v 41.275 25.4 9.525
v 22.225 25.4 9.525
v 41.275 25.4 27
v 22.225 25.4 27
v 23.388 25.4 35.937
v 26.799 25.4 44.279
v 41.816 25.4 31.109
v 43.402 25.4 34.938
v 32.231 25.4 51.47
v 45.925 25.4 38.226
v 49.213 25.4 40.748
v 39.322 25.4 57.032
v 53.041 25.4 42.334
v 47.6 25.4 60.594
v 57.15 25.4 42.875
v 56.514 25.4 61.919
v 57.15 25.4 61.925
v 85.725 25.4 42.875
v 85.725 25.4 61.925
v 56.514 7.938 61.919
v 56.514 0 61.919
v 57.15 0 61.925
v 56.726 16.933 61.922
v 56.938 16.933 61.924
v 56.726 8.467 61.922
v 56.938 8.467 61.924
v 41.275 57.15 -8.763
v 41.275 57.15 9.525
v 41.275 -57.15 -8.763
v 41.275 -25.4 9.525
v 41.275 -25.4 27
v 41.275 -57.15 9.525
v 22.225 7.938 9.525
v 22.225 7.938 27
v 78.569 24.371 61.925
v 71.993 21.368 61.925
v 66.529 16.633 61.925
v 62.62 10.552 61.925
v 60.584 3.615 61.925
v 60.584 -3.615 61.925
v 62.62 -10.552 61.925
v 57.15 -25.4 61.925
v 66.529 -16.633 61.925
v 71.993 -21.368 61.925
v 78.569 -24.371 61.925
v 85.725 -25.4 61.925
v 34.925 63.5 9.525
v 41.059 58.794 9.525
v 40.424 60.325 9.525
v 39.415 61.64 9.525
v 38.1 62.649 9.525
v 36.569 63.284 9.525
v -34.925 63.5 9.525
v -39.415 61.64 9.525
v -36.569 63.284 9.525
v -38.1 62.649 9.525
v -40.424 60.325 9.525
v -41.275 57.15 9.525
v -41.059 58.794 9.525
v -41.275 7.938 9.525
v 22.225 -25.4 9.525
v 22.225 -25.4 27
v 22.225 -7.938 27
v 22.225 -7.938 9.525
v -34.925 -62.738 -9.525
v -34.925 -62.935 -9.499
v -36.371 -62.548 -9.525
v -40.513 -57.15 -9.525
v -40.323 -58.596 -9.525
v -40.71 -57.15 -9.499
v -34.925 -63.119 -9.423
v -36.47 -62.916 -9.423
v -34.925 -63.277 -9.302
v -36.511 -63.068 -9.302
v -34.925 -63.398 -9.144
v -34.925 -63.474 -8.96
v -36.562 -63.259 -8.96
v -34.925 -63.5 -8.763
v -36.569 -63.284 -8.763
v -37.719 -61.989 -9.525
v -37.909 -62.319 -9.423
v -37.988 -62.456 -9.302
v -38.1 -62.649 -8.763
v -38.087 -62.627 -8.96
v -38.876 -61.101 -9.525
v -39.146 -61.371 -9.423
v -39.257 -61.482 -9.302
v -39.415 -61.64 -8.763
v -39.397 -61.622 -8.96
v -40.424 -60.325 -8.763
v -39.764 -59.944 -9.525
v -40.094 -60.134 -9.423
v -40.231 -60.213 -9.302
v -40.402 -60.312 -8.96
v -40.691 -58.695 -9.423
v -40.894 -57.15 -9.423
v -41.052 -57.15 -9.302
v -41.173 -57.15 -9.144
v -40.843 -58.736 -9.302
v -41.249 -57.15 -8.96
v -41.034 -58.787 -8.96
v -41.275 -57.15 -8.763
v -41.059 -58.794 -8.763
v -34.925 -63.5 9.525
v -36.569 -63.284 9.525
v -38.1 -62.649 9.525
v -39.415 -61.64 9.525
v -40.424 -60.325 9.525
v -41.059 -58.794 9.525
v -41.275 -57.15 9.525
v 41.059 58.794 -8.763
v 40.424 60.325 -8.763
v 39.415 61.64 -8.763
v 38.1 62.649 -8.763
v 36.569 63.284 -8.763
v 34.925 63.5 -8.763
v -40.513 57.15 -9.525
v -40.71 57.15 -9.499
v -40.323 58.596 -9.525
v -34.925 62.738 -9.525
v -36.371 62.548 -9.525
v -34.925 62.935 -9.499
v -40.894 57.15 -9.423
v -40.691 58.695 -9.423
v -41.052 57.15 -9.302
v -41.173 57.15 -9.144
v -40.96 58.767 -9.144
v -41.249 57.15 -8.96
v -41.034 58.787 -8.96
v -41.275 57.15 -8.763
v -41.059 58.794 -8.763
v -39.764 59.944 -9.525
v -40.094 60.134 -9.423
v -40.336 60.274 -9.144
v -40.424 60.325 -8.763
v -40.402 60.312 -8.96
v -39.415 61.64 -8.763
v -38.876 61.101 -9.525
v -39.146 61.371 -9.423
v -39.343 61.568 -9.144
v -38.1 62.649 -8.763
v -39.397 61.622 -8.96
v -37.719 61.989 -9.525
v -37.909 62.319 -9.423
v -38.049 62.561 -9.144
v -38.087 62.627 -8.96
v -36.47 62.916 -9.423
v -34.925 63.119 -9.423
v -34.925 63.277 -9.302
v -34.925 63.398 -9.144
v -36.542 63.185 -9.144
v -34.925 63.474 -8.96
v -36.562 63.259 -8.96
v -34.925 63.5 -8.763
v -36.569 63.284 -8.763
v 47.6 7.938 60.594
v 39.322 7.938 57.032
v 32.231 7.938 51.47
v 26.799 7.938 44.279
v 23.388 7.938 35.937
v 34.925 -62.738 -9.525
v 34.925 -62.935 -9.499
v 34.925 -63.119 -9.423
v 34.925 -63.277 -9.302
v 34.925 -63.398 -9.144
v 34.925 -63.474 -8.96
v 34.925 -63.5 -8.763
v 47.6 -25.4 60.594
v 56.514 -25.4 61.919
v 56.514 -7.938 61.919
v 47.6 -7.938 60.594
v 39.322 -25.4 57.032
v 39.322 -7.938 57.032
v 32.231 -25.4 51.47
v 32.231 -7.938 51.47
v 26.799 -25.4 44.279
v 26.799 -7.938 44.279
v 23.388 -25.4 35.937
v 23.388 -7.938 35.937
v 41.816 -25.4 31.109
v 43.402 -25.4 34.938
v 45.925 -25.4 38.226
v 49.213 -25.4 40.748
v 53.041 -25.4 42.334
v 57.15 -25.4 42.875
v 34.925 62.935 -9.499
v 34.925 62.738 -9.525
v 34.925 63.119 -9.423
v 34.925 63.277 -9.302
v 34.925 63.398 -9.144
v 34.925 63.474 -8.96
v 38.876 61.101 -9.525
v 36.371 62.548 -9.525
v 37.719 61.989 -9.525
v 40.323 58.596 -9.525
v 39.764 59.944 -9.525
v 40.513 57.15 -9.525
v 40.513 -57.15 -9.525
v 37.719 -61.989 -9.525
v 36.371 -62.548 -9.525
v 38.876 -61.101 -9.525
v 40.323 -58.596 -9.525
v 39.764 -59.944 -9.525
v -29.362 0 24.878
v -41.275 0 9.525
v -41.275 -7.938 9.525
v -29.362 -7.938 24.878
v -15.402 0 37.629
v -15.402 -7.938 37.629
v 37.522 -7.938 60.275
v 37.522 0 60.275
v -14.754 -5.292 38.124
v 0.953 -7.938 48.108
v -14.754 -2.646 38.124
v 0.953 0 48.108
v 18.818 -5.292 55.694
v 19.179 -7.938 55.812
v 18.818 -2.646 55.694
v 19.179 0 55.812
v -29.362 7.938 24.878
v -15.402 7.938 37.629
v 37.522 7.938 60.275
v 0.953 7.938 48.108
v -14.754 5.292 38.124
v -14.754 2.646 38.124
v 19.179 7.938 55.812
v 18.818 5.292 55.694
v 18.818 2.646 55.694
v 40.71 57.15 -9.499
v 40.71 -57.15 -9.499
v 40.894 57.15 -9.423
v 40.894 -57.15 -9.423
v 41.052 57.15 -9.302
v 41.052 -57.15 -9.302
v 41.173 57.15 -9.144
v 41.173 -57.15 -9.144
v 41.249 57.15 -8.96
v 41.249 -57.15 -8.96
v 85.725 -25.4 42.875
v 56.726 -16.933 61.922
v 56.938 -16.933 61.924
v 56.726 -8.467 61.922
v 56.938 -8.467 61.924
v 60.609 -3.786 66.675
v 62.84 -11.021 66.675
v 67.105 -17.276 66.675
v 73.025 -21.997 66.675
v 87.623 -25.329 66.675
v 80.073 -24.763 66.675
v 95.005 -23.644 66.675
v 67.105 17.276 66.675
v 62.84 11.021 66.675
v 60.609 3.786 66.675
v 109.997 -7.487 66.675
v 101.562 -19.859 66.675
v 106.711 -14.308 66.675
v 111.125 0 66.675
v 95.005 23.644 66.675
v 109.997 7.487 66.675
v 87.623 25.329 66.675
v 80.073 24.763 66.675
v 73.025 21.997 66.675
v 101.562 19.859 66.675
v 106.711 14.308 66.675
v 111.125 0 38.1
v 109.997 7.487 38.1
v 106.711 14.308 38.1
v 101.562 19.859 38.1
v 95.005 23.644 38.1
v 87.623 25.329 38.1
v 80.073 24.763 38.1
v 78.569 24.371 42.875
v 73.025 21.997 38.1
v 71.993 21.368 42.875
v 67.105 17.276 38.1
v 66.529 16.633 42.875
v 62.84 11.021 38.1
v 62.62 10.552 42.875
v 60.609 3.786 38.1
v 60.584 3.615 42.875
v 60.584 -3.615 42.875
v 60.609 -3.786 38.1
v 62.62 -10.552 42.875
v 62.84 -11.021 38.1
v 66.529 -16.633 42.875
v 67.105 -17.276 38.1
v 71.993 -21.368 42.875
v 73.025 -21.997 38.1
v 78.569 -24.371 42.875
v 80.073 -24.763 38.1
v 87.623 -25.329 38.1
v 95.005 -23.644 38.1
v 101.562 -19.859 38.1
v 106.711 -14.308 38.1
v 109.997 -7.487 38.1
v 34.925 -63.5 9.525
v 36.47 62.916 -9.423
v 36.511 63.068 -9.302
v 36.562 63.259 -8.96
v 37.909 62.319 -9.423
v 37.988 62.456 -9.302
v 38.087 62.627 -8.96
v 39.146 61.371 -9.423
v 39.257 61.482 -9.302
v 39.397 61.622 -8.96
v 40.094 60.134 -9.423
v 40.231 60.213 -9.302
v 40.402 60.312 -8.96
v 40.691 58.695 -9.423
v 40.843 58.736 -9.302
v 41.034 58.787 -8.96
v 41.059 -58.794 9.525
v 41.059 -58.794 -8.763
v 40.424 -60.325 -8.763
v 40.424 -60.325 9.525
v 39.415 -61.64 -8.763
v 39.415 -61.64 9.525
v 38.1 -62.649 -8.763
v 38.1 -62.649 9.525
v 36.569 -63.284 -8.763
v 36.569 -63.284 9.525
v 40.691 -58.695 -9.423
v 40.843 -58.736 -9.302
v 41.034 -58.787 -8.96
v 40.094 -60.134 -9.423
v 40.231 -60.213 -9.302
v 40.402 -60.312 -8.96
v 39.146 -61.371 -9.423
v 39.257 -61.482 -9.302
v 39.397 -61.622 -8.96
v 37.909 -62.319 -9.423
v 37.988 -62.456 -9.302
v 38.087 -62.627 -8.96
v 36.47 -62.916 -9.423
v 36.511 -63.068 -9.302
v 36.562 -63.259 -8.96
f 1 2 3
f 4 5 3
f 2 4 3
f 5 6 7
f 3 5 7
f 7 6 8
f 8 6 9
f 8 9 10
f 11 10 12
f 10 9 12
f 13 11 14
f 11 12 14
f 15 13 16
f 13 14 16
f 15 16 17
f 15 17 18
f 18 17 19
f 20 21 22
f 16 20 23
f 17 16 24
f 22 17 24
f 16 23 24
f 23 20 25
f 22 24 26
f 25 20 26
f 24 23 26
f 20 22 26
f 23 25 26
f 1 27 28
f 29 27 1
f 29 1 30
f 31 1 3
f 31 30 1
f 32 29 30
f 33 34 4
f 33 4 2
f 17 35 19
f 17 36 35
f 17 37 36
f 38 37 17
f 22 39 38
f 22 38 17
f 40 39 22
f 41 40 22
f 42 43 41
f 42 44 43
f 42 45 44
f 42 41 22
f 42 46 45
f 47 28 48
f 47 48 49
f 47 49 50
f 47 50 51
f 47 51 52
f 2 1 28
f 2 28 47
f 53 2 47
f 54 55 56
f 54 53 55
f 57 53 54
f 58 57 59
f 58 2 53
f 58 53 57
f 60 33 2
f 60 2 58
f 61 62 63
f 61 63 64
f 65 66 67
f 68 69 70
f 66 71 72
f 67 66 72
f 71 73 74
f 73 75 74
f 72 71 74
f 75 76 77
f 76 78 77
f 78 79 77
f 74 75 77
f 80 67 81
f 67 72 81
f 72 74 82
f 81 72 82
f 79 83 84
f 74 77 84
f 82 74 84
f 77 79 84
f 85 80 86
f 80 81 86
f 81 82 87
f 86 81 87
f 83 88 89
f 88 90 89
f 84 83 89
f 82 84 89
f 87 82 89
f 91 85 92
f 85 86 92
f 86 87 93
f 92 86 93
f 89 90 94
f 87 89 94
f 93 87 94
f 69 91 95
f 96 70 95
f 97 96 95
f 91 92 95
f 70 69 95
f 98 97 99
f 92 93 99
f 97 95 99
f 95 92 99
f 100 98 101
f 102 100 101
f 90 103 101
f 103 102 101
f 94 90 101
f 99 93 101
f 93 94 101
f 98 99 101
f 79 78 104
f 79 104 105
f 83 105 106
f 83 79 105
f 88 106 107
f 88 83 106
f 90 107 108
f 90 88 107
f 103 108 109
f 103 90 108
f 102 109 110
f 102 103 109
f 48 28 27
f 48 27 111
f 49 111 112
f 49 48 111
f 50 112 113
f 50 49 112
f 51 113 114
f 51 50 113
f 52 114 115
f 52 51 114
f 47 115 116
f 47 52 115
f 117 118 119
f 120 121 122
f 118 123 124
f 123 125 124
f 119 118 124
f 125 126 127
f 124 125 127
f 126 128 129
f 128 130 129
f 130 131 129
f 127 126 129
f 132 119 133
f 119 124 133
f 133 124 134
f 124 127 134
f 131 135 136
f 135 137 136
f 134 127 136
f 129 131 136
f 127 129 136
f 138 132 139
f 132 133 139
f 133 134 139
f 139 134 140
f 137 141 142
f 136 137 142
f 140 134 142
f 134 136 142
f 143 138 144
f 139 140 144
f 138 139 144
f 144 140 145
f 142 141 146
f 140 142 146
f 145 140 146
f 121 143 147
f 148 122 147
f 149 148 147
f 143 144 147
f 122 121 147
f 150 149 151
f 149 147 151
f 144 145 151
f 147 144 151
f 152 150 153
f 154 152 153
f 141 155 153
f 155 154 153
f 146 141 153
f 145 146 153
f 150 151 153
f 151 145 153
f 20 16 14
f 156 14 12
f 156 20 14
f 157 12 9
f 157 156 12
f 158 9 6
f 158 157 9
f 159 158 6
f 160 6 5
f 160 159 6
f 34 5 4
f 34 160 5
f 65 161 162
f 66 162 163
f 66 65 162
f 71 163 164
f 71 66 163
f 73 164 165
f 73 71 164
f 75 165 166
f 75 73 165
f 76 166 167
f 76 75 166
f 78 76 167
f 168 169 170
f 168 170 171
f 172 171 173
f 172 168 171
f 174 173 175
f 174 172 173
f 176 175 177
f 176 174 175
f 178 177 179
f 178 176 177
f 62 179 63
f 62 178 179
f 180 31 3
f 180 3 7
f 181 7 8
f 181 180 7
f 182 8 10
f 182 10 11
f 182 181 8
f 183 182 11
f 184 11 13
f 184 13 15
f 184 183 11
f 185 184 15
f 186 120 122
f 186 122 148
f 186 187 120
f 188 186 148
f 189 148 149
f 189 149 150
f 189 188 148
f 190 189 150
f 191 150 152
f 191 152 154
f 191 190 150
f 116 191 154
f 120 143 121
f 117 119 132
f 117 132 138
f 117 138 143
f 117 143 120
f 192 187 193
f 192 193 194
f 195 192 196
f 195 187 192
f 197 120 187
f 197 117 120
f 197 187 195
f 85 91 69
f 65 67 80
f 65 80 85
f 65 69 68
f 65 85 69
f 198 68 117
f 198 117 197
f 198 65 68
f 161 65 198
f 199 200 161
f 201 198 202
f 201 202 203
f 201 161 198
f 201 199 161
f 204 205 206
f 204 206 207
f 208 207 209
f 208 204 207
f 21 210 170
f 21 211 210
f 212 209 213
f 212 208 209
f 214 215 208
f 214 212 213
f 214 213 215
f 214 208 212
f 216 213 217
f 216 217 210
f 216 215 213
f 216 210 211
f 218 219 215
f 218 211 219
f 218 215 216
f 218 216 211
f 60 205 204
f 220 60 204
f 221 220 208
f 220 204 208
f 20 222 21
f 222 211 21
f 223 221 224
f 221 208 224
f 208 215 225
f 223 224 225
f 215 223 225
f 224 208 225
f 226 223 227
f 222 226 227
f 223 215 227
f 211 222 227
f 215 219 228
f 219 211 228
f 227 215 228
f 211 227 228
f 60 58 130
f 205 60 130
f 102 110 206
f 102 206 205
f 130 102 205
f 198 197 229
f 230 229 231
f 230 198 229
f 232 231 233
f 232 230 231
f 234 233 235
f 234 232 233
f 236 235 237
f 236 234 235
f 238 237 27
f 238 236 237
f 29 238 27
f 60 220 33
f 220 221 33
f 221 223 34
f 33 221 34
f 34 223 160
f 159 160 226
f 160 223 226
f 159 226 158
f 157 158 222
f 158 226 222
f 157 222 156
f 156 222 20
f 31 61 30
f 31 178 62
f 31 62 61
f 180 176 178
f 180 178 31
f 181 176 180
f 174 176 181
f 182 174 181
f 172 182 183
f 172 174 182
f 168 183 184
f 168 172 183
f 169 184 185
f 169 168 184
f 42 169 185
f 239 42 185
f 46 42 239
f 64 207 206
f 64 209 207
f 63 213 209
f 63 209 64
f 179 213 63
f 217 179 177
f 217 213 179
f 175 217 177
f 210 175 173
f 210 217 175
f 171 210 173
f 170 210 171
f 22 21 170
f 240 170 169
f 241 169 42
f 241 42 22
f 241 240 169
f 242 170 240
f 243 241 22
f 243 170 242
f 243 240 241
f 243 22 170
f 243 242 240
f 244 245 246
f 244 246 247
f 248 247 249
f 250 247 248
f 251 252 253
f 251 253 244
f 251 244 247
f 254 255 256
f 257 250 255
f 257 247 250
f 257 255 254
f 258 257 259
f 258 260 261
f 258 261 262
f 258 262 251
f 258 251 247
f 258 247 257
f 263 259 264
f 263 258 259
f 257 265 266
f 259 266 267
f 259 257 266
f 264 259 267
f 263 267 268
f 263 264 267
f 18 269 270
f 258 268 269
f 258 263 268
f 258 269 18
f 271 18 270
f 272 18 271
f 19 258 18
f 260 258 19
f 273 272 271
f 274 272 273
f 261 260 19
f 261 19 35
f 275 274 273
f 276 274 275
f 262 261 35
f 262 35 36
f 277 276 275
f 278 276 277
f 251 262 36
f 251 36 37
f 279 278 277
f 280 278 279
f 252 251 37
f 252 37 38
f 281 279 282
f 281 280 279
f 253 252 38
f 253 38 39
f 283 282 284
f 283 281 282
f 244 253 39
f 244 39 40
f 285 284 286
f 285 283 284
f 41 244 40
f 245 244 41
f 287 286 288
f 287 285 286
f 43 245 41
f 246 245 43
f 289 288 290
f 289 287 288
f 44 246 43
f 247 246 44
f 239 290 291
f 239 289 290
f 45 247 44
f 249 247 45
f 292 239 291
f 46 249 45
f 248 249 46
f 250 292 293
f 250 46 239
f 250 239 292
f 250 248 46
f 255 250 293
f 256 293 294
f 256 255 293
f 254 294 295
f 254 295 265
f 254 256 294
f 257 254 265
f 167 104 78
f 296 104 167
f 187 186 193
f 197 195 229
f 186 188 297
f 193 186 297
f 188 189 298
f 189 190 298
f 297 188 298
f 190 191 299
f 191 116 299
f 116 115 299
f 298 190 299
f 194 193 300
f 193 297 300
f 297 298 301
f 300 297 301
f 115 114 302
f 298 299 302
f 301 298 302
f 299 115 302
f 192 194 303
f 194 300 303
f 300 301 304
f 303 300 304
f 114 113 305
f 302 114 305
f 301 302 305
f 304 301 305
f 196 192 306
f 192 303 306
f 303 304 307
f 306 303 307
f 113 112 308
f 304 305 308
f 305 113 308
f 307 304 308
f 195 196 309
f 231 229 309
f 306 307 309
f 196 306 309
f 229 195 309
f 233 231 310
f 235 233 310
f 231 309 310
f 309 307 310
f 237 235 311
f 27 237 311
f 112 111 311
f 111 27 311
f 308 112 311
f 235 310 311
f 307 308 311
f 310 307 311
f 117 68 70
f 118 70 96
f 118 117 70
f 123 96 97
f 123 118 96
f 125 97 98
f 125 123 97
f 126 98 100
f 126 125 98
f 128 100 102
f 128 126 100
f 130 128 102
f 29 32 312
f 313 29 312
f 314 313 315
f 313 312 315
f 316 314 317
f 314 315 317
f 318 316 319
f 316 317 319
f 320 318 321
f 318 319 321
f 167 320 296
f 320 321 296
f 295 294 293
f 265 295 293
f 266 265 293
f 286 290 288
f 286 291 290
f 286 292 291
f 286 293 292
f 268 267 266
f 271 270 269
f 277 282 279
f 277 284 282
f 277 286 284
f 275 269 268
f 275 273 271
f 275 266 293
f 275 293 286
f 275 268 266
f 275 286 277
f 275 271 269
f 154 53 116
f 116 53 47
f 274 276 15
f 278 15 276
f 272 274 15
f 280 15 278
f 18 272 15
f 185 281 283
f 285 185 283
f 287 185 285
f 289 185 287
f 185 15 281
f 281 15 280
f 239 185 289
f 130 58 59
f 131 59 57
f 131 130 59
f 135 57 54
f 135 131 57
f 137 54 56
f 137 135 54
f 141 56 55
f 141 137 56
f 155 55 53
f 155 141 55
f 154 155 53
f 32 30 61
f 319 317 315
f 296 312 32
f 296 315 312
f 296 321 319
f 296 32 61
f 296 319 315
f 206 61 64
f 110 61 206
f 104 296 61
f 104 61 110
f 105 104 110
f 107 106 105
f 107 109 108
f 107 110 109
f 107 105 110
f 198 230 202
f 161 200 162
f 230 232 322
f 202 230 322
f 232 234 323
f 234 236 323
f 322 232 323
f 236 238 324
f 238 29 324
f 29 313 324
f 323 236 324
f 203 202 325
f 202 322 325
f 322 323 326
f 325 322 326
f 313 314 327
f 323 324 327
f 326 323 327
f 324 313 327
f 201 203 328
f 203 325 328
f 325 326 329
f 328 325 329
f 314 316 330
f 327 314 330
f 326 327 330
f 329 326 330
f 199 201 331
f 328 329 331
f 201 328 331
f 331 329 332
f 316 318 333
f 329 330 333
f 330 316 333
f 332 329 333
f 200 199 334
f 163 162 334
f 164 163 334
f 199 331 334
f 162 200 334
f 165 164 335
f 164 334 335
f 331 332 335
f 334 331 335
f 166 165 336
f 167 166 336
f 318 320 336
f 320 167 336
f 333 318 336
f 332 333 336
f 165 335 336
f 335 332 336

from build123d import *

# Parameters (mm, degrees)
F1_DEPTH = 63.5
F0_W     = 25.4
F0_H     = 19.05
F2_DEPTH = 25.4
F3_DEPTH = 7.9375
F5_R     = 6.35
F6_R     = 0.762


with BuildPart() as f1:
    # F0 (on Front) → F1 (new body, symmetric)
    with BuildSketch(Plane.XZ):
        Polygon((41.275, -9.525), (41.275, 9.525), (22.225, 9.525), (-41.275, 9.525), (-41.275, -9.525), align=None)
    extrude(amount=F1_DEPTH, both=True)

    # F0 (on Front) → F2 (join, symmetric)
    with BuildSketch(Plane.XZ):
        with BuildLine():
            Line((22.225, 9.525), (41.275, 9.525))
            Line((41.275, 9.525), (41.275, 27.0002))
            ThreePointArc((41.275, 27.0002), (45.9246798487, 38.2255201513), (57.15, 42.8752))
            Line((57.15, 42.8752), (60.325, 42.8752))
            Line((60.325, 42.8752), (60.325, 61.9252))
            Line((60.325, 61.9252), (57.15, 61.9252))
            add(Edge.make_bspline(
                [(56.5144411646, 61.9194166288), (56.7262412244, 61.9218660962), (56.9380948845, 61.9237939637), (57.15, 61.9252)],
                knots=[110.8989098022, 110.8989098022, 110.8989098022, 110.8989098022, 111.5045361635, 111.5045361635, 111.5045361635, 111.5045361635], degree=3))
            ThreePointArc((56.5144411646, 61.9194166288), (32.2306047693, 51.4701686623), (22.225, 27.0002))
            Line((22.225, 27.0002), (22.225, 9.525))
        make_face()
        with Locations((73.025, 52.4002)):
            Rectangle(F0_W, F0_H)
    extrude(amount=F2_DEPTH, both=True)

    # F0 (on Front) → F3 (join, symmetric)
    with BuildSketch(Plane.XZ):
        with BuildLine():
            Line((-41.275, 9.525), (22.225, 9.525))
            Line((22.225, 9.525), (22.225, 27.0002))
            ThreePointArc((22.225, 27.0002), (32.2306047693, 51.4701686623), (56.5144411646, 61.9194166288))
            add(Edge.make_bspline(
                [(-41.275, 9.525), (-19.2555756955, 43.5326460608), (17.7307995872, 61.4708838699), (56.5144411646, 61.9194166288)],
                knots=[0, 0, 0, 0, 110.8989098022, 110.8989098022, 110.8989098022, 110.8989098022], degree=3))
        make_face()
    extrude(amount=F3_DEPTH, both=True)

    # F0 (on Front) → F4 (revolve)
    with BuildSketch(Plane.XZ):
        Polygon((85.725, 61.9252), (85.725, 42.8752), (85.725, 38.1), (111.125, 38.1), (111.125, 66.675), (85.725, 66.675), align=None)
    revolve(axis=Axis((85.725, 0, 52.3875), (0, 0, 1)))

    # F5
    f5_edges = [f1.edges().sort_by_distance(p)[0] for p in [
        (-41.275, -63.5, 0),
        (41.275, -63.5, 0),
        (41.275, 63.5, 0),
        (-41.275, 63.5, 0),
    ]]
    fillet(f5_edges, radius=F5_R)

    # F6
    f6_edges = [f1.edges().sort_by_distance(p)[0] for p in [
        (0, 63.5, -9.525),
        (-39.415128, 61.640128, -9.525),
        (39.415128, 61.640128, -9.525),
        (-41.275, 0, -9.525),
        (41.275, 0, -9.525),
        (-39.415128, -61.640128, -9.525),
        (39.415128, -61.640128, -9.525),
        (0, -63.5, -9.525),
    ]]
    fillet(f6_edges, radius=F6_R)


solid = f1.part
